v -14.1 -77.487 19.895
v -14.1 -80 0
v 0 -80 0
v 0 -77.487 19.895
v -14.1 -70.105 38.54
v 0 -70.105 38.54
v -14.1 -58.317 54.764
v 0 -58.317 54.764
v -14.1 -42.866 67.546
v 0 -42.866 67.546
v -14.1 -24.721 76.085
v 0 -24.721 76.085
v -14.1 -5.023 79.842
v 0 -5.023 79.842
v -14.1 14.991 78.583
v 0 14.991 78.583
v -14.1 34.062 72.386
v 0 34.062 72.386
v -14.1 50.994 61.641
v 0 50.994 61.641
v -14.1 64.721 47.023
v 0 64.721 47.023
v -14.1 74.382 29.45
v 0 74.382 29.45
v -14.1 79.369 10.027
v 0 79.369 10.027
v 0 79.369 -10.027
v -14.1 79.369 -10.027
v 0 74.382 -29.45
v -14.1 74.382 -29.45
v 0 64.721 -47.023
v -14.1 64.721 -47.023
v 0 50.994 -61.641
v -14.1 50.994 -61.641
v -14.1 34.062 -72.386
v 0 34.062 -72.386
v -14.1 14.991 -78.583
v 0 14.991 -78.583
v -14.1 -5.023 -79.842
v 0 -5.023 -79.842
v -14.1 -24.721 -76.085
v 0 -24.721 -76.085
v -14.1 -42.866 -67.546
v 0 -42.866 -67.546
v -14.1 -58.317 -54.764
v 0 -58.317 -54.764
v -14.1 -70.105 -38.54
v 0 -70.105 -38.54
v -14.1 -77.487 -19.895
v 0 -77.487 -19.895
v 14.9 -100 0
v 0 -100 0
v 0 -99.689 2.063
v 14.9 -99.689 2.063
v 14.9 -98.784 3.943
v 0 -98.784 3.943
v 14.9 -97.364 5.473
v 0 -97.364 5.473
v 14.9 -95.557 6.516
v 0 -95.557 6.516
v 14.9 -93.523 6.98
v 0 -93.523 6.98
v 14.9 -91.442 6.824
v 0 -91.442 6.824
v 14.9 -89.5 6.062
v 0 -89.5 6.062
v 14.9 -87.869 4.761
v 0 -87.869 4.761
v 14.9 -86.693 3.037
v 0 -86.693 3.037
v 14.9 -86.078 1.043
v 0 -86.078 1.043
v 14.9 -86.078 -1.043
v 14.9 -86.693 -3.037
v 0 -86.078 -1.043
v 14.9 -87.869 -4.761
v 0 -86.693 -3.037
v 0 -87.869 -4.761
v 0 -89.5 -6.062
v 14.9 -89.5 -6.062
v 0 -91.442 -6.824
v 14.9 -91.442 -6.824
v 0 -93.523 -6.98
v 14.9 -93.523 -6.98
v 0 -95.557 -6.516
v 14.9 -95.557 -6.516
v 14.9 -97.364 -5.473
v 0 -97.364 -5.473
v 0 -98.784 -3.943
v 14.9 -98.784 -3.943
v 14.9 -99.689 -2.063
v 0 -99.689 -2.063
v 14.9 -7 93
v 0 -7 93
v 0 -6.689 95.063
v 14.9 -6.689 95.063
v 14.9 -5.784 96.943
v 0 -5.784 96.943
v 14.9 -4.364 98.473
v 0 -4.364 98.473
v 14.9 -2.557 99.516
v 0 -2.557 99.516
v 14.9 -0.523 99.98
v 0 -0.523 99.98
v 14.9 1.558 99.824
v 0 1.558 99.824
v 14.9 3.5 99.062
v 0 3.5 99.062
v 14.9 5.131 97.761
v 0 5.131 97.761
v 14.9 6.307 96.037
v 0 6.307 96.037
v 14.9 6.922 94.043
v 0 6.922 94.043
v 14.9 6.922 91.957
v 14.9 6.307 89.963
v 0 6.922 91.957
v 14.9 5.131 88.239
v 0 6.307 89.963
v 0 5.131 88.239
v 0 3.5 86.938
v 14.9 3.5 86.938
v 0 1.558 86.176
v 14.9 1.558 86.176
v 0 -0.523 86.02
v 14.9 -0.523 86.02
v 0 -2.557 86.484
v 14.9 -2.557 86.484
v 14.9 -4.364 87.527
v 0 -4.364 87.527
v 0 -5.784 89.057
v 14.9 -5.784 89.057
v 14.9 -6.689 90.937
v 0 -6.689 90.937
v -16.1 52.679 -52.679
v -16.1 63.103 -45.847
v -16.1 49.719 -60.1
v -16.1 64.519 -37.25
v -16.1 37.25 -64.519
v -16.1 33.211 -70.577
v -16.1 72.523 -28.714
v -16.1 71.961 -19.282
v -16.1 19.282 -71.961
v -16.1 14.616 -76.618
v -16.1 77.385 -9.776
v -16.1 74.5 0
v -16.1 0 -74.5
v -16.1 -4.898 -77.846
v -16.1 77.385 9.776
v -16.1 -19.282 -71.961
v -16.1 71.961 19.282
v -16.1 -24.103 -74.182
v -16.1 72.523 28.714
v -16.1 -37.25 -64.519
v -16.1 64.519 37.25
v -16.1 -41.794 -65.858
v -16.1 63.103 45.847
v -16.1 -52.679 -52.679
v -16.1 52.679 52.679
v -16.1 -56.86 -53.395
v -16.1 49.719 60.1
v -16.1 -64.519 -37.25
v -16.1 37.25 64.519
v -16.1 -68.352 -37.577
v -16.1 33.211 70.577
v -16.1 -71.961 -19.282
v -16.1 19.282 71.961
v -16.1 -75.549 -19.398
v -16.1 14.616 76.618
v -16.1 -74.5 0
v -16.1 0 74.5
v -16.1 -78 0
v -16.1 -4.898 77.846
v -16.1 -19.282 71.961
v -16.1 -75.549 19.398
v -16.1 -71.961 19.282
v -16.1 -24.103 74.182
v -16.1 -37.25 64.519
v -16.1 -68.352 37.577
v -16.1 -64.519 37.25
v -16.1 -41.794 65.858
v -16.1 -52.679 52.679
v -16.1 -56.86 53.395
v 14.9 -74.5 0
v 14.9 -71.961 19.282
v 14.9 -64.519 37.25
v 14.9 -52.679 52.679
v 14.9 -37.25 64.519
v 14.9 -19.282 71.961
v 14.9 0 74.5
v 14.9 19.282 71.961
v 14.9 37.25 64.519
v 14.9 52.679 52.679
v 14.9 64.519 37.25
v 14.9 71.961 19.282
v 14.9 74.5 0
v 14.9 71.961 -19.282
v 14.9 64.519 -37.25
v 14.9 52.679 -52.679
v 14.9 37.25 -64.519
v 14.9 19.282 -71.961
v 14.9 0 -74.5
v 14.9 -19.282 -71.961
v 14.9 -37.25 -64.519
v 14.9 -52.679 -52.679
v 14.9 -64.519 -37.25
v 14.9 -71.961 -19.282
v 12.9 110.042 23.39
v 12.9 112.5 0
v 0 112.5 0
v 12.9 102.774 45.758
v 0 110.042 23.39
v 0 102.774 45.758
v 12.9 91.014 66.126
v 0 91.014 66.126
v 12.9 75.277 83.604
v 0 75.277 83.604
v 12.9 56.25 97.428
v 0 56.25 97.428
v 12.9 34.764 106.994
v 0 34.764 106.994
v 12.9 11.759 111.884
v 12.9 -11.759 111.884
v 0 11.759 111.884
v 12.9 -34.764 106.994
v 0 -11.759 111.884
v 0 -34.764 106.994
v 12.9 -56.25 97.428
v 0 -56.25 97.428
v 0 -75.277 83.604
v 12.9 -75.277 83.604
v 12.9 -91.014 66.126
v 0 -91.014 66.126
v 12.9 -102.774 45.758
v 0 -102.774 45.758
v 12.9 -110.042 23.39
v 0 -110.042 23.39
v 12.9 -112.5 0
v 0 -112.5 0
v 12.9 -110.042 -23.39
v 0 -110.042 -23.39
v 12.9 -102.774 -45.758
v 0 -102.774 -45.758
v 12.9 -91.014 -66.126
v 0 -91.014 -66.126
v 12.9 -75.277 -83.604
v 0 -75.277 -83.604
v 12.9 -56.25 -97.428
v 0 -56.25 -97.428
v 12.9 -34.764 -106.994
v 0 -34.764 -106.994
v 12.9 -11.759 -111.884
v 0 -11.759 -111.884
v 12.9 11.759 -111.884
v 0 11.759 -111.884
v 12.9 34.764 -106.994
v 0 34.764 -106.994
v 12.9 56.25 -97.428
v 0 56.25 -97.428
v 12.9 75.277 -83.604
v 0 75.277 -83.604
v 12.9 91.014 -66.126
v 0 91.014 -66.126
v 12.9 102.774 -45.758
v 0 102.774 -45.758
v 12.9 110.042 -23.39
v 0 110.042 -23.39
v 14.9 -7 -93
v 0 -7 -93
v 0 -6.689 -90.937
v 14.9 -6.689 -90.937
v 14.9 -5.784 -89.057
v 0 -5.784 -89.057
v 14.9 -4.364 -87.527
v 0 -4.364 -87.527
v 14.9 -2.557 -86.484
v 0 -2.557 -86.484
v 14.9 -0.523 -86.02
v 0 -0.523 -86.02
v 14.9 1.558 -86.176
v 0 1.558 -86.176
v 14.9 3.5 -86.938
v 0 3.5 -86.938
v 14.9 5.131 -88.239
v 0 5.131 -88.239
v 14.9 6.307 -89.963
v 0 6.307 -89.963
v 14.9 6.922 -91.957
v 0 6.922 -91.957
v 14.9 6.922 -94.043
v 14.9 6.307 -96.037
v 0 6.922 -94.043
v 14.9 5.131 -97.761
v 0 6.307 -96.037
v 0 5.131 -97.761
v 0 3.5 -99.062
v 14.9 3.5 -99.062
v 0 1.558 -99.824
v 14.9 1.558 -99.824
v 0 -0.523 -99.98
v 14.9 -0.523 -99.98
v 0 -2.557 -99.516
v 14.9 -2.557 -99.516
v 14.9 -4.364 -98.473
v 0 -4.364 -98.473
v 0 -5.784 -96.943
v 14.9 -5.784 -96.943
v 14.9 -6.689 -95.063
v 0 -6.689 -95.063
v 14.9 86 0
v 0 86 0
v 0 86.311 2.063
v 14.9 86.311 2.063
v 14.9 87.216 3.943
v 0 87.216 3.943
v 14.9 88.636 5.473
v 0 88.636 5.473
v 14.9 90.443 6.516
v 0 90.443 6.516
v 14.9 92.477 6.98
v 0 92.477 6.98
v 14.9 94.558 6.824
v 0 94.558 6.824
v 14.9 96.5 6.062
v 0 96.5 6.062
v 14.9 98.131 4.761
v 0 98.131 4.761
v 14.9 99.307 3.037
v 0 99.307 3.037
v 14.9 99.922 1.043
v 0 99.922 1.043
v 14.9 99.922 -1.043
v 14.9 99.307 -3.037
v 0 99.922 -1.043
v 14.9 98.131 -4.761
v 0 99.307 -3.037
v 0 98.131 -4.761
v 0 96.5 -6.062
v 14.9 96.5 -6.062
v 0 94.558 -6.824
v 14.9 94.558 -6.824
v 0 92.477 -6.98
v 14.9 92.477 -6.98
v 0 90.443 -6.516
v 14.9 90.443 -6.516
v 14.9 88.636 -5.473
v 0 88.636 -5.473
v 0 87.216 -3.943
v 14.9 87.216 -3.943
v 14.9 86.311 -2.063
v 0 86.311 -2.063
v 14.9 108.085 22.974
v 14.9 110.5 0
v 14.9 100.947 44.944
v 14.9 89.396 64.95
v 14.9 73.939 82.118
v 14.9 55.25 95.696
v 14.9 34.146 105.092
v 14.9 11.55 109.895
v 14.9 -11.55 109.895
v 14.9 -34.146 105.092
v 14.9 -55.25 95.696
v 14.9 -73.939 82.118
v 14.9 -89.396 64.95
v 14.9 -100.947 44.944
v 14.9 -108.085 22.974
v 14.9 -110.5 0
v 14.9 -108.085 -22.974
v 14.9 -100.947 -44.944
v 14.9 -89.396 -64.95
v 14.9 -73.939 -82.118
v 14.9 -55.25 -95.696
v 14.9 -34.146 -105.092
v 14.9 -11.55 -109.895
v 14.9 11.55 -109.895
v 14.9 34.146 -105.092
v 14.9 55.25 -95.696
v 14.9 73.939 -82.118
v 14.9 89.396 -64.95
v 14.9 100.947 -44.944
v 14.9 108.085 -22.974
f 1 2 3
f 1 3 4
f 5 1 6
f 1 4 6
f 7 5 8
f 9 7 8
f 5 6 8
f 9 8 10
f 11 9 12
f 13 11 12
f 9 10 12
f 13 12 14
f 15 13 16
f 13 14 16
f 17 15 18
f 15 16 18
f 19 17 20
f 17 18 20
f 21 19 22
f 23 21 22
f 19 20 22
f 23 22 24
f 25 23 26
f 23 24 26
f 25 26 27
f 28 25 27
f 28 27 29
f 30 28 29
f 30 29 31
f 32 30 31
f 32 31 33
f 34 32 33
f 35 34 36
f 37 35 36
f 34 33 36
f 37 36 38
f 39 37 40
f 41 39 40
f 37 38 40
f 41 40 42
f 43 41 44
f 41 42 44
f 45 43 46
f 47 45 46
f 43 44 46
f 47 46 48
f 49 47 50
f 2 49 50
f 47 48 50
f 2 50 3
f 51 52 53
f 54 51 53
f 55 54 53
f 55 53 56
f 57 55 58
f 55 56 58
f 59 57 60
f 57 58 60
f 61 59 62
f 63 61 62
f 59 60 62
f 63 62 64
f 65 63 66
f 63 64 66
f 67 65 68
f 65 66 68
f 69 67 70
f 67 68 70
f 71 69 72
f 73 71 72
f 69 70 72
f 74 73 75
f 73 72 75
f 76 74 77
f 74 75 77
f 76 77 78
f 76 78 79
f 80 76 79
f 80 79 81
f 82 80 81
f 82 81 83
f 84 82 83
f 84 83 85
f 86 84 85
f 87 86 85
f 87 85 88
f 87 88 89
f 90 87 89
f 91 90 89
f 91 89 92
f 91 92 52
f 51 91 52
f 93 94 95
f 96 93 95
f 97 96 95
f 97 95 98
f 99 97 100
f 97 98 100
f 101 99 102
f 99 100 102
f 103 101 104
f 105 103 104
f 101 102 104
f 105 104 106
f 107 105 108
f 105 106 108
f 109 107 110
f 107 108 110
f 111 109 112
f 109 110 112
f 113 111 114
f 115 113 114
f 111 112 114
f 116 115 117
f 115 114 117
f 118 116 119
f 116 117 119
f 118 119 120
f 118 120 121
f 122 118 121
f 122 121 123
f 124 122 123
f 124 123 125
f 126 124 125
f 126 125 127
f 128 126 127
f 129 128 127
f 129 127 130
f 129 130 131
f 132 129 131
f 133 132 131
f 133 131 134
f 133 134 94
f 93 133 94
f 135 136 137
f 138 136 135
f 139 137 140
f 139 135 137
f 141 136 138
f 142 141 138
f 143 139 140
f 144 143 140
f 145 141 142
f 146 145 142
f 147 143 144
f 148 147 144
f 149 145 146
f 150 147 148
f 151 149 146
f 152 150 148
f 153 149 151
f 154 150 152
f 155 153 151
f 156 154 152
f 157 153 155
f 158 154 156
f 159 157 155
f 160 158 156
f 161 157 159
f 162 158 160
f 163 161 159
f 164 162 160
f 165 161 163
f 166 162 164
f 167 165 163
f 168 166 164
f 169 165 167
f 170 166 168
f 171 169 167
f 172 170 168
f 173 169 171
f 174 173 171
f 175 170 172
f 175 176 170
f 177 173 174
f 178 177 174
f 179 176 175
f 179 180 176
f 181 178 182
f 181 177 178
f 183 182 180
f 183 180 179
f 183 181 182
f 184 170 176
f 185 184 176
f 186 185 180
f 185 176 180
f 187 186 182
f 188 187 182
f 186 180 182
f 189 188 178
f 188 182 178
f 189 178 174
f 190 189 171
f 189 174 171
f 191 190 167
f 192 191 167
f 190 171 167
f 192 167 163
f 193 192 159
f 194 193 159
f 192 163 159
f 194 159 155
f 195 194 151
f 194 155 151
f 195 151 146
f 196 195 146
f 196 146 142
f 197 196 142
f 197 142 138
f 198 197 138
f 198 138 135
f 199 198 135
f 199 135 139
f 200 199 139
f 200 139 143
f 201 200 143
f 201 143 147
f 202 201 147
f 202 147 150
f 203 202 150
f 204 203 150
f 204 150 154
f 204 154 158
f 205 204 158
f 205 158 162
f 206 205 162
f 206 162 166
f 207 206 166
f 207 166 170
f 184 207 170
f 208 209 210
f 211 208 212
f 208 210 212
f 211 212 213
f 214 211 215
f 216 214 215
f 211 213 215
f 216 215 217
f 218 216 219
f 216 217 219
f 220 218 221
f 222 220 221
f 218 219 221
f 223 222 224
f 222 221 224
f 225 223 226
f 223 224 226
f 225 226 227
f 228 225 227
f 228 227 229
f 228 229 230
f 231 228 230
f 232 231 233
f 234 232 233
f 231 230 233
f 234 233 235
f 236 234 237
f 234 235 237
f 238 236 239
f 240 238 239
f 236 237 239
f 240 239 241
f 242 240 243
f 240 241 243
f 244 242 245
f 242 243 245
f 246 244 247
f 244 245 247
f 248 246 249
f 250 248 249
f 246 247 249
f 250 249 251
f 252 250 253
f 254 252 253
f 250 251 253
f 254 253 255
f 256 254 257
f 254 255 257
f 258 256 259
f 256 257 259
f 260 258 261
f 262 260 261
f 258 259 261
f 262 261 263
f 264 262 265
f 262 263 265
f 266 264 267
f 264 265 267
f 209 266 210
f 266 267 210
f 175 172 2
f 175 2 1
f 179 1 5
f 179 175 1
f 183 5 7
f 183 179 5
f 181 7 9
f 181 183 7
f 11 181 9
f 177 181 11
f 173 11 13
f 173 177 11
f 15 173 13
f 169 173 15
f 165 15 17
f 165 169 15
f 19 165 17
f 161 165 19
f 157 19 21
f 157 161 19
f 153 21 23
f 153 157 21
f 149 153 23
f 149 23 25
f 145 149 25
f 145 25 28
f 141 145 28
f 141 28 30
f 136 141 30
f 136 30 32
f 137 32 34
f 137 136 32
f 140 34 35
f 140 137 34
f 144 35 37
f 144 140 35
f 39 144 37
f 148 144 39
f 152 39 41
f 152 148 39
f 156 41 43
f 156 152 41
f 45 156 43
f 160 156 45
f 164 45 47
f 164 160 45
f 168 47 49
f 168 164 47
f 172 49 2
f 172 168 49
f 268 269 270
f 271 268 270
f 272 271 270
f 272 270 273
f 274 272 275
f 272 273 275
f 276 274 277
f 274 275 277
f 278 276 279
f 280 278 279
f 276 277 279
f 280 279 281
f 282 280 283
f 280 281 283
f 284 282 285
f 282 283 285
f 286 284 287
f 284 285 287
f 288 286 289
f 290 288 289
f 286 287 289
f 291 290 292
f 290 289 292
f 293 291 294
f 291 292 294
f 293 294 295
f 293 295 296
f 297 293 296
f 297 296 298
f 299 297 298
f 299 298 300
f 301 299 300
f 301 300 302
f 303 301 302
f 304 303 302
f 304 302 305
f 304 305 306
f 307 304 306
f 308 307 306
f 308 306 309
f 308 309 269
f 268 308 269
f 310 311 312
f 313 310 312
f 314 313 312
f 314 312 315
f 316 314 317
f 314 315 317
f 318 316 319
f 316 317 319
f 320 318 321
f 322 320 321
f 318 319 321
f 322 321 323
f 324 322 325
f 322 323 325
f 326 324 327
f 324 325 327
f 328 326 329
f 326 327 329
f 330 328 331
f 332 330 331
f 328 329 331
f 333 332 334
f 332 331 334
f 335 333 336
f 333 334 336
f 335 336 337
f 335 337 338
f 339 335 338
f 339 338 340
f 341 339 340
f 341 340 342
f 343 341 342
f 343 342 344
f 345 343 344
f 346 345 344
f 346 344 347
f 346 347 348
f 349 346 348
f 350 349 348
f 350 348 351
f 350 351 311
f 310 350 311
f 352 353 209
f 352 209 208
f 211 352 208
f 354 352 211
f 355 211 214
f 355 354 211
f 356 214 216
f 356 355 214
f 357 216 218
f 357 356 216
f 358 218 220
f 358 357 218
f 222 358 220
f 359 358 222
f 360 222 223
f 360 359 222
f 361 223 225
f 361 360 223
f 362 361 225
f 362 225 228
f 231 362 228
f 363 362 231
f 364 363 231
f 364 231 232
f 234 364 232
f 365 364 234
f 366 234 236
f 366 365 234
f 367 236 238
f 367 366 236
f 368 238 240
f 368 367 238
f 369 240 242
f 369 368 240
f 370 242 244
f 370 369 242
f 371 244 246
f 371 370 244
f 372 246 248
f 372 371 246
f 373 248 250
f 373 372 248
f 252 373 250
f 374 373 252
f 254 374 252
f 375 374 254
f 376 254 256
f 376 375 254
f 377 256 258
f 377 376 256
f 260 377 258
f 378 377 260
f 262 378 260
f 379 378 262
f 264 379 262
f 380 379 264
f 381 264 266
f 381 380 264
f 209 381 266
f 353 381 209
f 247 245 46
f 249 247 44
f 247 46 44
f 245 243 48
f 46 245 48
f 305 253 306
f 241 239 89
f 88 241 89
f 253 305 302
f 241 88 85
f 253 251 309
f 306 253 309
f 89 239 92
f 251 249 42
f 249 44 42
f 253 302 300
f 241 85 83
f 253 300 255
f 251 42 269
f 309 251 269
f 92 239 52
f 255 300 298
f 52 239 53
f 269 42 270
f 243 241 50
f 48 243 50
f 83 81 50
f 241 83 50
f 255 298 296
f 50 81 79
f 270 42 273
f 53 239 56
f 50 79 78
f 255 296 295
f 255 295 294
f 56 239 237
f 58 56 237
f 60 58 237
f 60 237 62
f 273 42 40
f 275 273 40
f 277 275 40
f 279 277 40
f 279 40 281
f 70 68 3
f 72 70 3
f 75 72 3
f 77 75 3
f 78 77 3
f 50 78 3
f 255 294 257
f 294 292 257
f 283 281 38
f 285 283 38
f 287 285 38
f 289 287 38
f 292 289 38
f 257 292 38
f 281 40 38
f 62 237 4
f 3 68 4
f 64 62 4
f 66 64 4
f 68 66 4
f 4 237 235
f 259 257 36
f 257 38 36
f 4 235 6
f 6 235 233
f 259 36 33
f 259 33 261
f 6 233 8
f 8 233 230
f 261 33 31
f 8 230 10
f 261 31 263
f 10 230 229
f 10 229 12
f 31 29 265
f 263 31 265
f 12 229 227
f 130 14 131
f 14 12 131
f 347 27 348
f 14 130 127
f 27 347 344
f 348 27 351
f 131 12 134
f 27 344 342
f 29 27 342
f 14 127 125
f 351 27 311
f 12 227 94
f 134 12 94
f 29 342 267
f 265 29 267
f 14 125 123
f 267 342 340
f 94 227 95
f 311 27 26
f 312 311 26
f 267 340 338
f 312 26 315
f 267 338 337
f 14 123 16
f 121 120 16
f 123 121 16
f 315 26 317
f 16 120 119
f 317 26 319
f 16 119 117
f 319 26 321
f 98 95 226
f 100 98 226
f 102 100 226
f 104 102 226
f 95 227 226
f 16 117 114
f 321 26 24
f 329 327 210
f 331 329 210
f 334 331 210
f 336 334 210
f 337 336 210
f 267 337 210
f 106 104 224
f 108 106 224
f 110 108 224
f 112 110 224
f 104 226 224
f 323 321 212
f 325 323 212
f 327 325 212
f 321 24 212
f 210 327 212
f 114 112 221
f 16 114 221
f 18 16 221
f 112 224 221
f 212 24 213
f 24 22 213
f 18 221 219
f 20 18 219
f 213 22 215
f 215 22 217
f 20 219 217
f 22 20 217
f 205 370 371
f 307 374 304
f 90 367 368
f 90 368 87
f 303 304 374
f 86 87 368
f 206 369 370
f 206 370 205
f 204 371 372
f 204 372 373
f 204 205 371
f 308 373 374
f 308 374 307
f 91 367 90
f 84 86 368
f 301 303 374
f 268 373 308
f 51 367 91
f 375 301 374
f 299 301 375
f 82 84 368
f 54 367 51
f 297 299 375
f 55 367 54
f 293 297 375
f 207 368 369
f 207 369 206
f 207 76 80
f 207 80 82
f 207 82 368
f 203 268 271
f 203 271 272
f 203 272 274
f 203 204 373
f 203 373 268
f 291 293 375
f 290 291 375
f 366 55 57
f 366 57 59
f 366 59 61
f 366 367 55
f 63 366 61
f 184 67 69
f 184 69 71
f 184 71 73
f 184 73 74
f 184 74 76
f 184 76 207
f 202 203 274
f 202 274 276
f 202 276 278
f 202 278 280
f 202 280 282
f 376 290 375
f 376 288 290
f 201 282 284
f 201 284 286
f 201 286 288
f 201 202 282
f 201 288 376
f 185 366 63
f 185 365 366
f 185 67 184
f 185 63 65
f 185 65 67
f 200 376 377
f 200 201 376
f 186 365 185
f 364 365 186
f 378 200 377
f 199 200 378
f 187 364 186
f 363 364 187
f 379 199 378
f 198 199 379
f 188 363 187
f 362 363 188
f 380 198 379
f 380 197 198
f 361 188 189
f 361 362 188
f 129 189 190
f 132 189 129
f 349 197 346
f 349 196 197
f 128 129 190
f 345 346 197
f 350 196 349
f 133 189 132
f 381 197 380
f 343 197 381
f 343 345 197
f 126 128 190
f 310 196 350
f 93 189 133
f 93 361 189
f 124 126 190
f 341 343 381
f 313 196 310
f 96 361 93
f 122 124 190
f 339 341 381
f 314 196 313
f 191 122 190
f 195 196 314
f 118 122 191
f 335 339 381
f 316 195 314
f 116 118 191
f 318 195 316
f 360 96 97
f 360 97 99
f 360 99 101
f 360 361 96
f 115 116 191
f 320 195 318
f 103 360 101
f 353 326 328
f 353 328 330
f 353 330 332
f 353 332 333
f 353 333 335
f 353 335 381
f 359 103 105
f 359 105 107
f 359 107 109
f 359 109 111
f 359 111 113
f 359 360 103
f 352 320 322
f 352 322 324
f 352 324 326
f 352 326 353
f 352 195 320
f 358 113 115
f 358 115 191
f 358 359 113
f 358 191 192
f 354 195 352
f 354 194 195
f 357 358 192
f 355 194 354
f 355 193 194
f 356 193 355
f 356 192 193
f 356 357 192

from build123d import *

# Parameters (mm, degrees)
F0_R     = 112.5
F1_DEPTH = 14.9
F2_R     = 80
F3_DEPTH = 16.1
F4_SIZE  = 2
F5_R     = 74.5
F6_DEPTH = 31.001
F8_D     = 14


with BuildPart() as f1:
    # F0 (on Right) → F1 (new body)
    with BuildSketch(Plane.YZ):
        Circle(F0_R)
    extrude(amount=F1_DEPTH)

    # F2 (on face) → F3 (join)
    with BuildSketch(Plane(origin=(0, 0, 0), x_dir=(0, -1, 0), z_dir=(-1, 0, 0))):
        Circle(F2_R)
    extrude(amount=F3_DEPTH)

    # F4
    f4_edges = [f1.edges().sort_by_distance(p)[0] for p in [
        (-16.1, 80, 0),
        (14.9, -112.5, 0),
    ]]
    chamfer(f4_edges, length=F4_SIZE)

    # F5 (on face) → F6 (cut, through all)
    with BuildSketch(Plane(origin=(-16.1, 0, 0), x_dir=(0, -1, 0), z_dir=(-1, 0, 0))):
        Circle(F5_R)
    extrude(amount=-F6_DEPTH, mode=Mode.SUBTRACT)

    # F8 (through all)
    with Locations(Plane.YZ.offset(14.9)):
        with Locations((0, -93), (-93, 0), (0, 93), (93, 0)):
            Hole(F8_D / 2)


solid = f1.part
